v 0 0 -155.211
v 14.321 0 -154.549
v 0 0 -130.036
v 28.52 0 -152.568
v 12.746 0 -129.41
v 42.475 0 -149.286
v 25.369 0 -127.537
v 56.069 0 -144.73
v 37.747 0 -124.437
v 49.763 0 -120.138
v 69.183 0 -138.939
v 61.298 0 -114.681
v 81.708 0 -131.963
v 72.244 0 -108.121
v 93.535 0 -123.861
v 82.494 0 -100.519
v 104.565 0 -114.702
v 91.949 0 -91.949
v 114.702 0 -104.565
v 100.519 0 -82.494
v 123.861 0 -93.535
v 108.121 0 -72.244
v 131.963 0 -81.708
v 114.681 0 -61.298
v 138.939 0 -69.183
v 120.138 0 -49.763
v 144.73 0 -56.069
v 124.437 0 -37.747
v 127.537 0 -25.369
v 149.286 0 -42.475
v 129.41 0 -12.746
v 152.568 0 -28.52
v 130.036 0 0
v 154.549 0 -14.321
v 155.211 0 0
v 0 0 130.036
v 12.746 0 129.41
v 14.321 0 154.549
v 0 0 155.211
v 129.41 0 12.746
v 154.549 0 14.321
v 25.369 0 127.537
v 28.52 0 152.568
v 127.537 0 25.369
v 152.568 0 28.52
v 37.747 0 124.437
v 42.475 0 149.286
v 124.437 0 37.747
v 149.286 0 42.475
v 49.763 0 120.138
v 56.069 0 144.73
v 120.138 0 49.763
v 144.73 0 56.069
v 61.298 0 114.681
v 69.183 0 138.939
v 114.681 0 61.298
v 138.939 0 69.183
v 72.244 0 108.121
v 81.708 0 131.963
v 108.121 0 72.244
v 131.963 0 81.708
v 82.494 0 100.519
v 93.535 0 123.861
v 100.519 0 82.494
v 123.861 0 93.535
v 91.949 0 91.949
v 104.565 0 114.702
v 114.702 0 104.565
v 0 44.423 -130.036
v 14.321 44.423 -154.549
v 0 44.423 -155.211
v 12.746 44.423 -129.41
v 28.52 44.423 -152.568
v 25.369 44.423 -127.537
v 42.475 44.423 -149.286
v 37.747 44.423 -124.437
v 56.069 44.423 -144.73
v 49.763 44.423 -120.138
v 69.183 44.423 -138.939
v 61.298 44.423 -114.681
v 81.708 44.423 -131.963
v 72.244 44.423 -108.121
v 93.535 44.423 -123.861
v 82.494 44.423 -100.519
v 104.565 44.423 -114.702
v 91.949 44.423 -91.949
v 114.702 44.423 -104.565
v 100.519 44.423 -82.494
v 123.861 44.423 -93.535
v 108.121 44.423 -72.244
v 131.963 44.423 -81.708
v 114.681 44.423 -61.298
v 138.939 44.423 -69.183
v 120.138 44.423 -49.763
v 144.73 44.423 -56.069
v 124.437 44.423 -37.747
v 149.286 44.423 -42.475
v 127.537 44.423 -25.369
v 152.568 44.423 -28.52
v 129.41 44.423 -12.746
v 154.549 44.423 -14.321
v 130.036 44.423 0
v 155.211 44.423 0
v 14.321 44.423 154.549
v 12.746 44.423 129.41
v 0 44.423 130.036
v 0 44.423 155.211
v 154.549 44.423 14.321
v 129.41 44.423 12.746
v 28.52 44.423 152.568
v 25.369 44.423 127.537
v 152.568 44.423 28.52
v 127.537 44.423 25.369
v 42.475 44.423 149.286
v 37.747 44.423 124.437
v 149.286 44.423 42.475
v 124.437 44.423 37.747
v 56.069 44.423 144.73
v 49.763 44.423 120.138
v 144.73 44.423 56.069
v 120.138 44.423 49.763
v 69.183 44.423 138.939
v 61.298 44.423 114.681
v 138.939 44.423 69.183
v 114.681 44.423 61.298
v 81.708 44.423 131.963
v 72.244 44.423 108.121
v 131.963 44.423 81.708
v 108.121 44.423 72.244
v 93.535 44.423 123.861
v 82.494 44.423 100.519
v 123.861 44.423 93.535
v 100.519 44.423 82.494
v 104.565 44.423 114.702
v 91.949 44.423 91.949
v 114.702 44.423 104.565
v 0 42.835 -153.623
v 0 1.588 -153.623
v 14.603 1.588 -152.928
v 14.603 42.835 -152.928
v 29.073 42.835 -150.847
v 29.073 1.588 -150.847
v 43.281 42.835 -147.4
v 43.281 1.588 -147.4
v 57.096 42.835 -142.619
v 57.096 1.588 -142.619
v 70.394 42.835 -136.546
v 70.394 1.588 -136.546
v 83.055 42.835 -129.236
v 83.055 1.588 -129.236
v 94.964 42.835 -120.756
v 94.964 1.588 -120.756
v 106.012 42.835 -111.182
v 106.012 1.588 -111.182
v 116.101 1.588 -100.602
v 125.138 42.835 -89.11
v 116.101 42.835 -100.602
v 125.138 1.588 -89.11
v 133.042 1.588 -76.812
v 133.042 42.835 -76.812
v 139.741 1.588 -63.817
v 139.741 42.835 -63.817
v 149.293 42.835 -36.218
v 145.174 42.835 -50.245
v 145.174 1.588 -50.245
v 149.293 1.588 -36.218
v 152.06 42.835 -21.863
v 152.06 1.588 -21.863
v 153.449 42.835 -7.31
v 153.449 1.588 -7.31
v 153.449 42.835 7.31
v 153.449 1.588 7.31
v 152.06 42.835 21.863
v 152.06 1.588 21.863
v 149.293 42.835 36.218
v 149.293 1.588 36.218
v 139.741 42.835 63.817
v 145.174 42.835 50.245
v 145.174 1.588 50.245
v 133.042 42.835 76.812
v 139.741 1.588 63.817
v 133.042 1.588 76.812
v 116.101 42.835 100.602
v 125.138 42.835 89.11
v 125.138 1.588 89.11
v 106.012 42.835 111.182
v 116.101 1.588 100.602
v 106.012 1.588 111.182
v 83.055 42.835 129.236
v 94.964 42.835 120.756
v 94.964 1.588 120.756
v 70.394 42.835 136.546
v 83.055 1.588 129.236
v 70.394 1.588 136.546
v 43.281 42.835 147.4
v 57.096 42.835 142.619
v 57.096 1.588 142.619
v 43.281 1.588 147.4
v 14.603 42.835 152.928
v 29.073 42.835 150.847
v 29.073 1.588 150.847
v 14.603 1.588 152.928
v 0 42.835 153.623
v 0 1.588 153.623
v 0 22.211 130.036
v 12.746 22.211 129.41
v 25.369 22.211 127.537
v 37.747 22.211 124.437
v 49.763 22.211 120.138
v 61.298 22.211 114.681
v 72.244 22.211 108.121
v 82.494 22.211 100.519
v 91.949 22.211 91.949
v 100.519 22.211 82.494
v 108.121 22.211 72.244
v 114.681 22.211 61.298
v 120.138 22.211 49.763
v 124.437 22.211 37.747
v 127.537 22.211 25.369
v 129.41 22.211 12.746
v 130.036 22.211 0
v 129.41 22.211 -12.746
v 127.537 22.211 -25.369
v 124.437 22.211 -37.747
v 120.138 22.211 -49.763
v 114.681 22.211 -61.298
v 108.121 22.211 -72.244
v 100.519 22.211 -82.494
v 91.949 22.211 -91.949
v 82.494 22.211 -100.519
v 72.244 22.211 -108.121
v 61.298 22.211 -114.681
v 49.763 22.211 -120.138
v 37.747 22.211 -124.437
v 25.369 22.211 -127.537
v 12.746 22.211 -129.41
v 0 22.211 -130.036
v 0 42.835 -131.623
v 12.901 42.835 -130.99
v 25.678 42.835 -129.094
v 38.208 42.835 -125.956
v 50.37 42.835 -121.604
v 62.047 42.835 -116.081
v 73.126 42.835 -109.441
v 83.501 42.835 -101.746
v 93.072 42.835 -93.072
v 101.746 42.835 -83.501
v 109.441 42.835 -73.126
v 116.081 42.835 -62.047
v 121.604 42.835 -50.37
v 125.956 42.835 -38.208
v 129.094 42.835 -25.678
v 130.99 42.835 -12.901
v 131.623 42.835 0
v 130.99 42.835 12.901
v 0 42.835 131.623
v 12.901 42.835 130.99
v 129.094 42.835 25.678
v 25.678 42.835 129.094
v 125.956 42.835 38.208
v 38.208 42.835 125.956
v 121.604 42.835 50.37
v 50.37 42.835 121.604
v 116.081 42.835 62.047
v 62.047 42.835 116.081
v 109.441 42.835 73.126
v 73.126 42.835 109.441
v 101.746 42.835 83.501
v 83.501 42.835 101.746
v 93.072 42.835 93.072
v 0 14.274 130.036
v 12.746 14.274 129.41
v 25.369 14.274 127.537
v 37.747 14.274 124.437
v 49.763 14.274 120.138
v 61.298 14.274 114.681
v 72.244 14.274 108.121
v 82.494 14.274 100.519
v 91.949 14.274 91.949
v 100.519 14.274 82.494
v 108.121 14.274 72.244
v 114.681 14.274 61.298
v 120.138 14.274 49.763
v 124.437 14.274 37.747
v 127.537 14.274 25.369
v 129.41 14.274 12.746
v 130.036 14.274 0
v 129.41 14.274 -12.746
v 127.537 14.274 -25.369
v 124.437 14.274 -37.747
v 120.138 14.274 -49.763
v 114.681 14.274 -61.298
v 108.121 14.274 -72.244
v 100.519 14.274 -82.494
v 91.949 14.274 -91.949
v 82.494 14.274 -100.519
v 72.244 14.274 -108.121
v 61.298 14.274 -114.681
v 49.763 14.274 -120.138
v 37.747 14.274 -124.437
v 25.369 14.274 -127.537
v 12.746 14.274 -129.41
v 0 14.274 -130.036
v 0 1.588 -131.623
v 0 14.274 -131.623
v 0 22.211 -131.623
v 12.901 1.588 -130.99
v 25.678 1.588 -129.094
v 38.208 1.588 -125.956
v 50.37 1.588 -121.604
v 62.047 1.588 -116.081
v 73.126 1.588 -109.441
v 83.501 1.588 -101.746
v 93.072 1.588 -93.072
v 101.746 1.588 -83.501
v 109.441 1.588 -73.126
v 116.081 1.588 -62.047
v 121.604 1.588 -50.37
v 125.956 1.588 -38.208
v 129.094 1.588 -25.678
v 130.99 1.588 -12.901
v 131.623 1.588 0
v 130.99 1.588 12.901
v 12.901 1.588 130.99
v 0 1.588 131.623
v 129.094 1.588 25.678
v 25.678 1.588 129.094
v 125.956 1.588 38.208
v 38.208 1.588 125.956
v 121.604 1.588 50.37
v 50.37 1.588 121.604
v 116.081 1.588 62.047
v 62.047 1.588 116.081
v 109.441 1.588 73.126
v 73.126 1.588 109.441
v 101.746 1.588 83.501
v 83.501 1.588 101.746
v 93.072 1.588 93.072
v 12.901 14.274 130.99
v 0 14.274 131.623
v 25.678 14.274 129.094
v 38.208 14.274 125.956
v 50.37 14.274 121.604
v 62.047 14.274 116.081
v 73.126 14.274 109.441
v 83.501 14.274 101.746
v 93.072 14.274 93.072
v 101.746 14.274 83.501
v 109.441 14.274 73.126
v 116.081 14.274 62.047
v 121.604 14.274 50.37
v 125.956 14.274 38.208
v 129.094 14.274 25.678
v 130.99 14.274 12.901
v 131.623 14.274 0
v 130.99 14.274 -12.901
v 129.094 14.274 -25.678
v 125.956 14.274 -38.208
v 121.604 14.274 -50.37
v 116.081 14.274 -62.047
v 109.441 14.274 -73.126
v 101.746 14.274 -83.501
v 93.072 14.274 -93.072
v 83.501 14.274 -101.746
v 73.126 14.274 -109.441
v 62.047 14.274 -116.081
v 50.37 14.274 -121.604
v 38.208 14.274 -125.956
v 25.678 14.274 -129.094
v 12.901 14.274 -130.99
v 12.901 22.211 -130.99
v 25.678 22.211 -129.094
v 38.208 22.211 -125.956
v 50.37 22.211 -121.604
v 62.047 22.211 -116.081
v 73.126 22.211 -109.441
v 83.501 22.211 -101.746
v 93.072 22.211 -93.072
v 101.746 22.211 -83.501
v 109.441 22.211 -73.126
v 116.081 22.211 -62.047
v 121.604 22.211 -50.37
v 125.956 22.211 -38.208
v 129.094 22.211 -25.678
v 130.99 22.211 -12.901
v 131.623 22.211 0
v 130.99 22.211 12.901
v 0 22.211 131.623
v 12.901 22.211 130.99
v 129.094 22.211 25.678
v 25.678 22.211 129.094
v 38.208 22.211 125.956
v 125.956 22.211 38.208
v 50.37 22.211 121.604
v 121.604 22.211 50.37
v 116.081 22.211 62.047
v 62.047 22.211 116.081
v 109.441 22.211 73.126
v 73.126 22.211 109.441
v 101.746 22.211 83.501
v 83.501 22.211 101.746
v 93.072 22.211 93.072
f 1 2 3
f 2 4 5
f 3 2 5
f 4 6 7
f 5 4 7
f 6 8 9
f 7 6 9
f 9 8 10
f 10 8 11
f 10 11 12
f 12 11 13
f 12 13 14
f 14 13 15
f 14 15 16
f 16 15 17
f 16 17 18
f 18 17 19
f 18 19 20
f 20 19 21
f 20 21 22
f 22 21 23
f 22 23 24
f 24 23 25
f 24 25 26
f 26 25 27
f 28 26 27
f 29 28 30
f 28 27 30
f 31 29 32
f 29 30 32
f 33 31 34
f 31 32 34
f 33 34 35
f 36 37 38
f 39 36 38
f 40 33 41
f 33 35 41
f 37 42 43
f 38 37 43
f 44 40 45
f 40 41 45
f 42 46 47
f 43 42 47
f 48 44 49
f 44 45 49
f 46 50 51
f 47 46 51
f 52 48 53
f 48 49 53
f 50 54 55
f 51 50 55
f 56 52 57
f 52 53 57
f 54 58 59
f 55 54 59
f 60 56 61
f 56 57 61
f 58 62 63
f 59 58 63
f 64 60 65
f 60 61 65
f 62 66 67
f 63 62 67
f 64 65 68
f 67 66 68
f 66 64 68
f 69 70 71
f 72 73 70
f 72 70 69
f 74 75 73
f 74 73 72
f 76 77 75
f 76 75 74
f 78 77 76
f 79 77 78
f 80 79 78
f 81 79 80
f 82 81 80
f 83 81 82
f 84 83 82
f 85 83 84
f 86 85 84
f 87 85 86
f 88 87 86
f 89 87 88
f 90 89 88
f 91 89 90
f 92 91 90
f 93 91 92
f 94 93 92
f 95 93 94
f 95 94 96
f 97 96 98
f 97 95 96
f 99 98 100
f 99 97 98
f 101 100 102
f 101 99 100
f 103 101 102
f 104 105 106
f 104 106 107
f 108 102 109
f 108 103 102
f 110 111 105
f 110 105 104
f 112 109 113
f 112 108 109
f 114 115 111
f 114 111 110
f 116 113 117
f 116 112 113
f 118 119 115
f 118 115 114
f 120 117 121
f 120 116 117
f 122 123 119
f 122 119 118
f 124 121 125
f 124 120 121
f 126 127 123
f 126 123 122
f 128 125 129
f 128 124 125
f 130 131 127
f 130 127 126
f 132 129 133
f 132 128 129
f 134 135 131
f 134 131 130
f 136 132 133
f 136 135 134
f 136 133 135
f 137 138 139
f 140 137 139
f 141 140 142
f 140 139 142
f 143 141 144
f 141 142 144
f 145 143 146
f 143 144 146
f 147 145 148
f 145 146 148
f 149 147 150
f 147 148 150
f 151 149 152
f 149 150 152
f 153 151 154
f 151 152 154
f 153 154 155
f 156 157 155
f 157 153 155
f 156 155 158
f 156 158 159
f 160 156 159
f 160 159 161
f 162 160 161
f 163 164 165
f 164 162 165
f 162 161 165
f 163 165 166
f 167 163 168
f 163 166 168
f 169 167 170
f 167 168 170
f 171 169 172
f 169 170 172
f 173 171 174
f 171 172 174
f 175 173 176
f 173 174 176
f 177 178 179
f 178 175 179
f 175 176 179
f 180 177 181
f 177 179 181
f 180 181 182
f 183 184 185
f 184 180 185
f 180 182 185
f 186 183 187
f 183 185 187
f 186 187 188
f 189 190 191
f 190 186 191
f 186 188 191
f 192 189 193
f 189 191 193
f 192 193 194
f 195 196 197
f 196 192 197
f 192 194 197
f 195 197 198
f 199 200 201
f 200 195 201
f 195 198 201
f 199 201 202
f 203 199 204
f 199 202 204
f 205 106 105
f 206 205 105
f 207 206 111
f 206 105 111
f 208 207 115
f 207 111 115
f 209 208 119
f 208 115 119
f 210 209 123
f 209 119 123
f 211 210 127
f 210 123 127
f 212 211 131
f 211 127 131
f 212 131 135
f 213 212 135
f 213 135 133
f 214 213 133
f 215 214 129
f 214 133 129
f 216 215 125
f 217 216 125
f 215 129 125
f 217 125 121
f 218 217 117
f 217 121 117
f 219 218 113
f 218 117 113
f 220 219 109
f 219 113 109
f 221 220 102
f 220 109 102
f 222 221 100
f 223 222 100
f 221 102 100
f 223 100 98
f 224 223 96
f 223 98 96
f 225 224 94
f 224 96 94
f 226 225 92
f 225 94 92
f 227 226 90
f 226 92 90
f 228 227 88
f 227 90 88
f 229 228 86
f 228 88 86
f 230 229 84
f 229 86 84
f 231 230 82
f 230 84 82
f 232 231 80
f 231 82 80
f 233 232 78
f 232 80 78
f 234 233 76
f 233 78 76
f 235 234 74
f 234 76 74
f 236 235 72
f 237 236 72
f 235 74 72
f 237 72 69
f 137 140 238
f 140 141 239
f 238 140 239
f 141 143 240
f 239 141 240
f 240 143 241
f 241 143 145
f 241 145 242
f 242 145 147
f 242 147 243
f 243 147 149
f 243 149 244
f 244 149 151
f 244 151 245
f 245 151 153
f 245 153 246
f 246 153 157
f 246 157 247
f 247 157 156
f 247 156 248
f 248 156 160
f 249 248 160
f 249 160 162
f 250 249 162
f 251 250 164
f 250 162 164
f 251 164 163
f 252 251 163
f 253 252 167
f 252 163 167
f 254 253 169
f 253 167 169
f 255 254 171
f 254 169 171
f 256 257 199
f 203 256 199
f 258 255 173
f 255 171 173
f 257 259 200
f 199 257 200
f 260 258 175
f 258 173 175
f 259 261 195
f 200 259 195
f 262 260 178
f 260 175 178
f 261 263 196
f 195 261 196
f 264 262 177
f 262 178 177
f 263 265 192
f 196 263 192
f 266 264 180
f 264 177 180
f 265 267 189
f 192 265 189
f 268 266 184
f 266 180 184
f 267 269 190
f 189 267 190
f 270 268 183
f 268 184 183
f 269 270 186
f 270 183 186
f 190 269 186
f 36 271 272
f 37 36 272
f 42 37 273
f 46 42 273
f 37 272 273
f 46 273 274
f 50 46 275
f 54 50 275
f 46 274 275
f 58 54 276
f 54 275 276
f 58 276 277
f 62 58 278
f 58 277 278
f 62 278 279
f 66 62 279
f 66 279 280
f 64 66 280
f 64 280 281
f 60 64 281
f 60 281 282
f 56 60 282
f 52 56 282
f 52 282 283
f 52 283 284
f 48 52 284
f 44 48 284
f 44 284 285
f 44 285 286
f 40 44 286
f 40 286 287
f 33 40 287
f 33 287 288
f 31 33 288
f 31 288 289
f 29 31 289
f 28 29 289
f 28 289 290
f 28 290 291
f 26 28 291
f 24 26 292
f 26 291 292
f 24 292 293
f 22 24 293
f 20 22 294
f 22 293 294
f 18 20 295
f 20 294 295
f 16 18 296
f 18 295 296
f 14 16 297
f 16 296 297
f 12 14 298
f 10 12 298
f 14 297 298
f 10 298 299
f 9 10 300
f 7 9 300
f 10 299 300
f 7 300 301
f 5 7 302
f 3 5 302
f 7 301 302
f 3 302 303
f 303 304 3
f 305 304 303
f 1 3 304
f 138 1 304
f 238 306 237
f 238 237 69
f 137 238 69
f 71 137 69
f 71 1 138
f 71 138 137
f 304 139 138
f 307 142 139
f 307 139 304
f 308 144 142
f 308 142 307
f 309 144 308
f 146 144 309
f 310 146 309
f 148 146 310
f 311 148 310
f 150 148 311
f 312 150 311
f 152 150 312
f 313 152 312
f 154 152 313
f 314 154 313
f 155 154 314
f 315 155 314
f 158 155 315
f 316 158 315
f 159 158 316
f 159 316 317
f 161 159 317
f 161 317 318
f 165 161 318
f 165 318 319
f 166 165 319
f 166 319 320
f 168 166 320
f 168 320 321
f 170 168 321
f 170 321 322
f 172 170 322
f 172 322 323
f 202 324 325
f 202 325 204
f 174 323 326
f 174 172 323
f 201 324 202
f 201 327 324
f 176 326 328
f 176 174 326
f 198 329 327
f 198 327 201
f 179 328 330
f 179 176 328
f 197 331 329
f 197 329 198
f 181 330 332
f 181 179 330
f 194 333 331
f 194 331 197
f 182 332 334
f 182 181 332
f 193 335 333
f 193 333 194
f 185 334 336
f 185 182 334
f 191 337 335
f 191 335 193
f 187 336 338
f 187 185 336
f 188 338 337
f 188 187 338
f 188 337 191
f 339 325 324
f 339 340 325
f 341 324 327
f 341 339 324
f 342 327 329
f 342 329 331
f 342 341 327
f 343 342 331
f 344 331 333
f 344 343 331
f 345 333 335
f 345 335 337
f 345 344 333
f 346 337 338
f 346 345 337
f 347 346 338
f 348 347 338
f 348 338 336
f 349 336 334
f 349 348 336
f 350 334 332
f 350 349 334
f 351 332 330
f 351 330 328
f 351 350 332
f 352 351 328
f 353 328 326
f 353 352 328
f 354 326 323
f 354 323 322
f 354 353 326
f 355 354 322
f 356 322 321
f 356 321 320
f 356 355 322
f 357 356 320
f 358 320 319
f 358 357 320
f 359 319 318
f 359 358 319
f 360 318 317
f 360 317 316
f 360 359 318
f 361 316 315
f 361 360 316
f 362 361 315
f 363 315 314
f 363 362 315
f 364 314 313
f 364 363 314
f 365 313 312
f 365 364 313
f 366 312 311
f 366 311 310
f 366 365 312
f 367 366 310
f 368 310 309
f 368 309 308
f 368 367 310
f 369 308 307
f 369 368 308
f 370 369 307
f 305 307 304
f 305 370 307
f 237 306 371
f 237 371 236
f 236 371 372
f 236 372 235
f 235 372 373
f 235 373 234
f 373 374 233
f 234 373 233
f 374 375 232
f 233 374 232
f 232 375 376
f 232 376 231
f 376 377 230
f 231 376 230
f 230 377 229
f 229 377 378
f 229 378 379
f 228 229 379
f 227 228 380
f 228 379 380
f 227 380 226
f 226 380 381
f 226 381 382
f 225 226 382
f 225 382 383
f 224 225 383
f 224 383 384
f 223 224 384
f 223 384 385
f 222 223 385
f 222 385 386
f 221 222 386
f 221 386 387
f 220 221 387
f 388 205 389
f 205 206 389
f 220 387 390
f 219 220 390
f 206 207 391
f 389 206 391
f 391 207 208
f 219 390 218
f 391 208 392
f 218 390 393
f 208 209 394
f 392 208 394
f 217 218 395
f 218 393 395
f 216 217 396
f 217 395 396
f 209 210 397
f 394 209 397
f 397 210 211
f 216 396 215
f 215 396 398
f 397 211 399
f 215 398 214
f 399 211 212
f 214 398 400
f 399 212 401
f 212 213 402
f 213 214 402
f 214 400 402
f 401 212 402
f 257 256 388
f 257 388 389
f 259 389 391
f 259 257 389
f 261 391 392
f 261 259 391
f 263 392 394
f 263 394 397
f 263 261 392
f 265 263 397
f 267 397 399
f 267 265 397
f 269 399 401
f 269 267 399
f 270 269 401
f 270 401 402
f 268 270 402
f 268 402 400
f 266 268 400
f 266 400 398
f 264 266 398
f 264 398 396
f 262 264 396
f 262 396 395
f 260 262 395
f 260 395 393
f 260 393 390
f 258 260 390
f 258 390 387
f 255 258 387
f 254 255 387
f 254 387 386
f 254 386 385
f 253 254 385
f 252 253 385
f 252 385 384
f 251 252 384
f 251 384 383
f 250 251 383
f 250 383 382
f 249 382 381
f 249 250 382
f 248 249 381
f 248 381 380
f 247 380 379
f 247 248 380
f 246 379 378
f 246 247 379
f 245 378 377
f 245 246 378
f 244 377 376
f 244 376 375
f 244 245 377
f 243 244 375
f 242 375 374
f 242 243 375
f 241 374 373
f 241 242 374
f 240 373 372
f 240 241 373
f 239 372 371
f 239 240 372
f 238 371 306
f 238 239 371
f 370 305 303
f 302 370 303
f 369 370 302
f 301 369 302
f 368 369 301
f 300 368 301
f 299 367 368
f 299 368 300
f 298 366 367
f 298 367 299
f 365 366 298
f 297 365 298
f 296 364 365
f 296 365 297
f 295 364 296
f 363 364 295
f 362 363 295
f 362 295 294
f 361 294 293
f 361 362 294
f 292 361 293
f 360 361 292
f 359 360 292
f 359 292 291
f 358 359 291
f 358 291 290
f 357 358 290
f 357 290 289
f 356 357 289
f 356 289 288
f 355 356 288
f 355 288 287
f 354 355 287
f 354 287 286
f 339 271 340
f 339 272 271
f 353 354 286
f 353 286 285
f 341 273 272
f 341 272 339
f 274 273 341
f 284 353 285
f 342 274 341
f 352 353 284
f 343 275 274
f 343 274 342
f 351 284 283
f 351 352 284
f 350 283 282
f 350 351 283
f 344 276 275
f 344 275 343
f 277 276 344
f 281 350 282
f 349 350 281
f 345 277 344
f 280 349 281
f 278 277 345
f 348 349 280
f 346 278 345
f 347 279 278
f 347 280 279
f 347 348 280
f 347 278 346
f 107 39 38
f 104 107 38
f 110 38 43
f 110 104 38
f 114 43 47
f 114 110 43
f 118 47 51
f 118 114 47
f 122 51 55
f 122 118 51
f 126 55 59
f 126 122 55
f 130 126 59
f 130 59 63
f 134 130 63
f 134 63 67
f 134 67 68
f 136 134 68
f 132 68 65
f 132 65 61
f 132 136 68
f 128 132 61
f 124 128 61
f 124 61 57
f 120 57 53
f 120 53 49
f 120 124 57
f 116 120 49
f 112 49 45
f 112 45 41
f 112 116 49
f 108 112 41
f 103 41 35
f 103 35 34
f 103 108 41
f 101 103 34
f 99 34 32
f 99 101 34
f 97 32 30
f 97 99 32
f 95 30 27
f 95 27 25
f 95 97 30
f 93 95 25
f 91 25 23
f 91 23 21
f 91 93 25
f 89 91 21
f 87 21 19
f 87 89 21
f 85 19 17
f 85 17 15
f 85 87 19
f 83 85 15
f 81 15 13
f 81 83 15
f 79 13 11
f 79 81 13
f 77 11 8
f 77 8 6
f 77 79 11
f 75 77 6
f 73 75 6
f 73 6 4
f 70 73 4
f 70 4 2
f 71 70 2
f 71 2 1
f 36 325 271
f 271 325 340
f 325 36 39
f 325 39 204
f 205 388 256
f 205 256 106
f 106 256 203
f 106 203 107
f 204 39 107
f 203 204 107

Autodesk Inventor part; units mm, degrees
ref_plane "YZ Plane" through (0, 0, 0) normal (1, 0, 0) x (0, 1, 0)
ref_plane "XZ Plane" through (0, 0, 0) normal (0, 1, 0) x (-1, 0, 0)
ref_plane "XY Plane" through (0, 0, 0) normal (0, 0, 1) x (1, 0, 0)
sketch "Sketch1" plane through (0, 0, 0) normal (1, 0, 0) x (0, 1, 0)
  line L0 (0, 0) -> (73.993, 0)
  line L1 (0, 130.0359) -> (44.4227, 130.0359)
  line L2 (0, 130.0359) -> (0, 155.2107)
  line L3 (0, 155.2107) -> (44.4227, 155.2107)
  line L4 (44.4227, 155.2107) -> (44.4227, 130.0359)
  line L5 (42.8352, 153.6232) -> (1.5875, 153.6232)
  line L6 (1.5875, 153.6232) -> (1.5875, 131.6234)
  line L7 (1.5875, 131.6234) -> (42.8352, 131.6234)
  line L8 (42.8352, 131.6234) -> (42.8352, 153.6232)
  line L9 (18.2426, 143.1015) -> (18.2426, 119.3292)
  line L10 (14.2738, 131.6234) -> (14.2738, 130.0359)
  line L11 (22.2113, 131.6234) -> (22.2113, 130.0359)
  dimension "d1" = 25.1748
  dimension "d2" = 130.0359
  dimension "d3" = 44.4227
  dimension "d4" = 0
  dimension "d5" = 1.5875
  dimension "d6" = 1.5875
  dimension "d7" = 1.5875
  dimension "d8" = 1.5875
  dimension "d9" = 18.2426
  dimension "d10" = 7.9375
  dimension "d11" = 3.9688
revolve "Revolution1" add sketch "Sketch1" angle 180 about axis through (0, 0, 0) along (0, 1, 0) contours L2 L3 L4 L1 L11 L7 L8 L5 L6 L10
equation "\"d2\" = 0.5 * IBDia - 3 * SpWall"
equation "\"d3\" = Wall + 4 * SpWall + BevDriverDia + d1_1"
equation "\"d5\" = Wall"
equation "\"d6\" = Wall"
equation "\"d7\" = Wall"
equation "\"d8\" = Wall"
equation "\"d9\" = 2 * SpWall + 0.5 * BevDriverDia"
equation "\"d10\" = AxelDia + Space"
equation "\"d11\" = 0.5 * Space + 0.5 * AxelDia"
equation "\"IDia\" = 266.7"
equation "\"Wall\" = 1.5875"
equation "\"Space\" = 1.5875"
equation "\"SpWall\" = 3.175"
equation "\"AxelDia\" = 6.35"
equation "\"IBDia\" = 279.121792"
equation "\"BevDriverDia\" = 23.785175"
equation "\"d1_1\" = 6.35"
properties part number "OuterShell"
